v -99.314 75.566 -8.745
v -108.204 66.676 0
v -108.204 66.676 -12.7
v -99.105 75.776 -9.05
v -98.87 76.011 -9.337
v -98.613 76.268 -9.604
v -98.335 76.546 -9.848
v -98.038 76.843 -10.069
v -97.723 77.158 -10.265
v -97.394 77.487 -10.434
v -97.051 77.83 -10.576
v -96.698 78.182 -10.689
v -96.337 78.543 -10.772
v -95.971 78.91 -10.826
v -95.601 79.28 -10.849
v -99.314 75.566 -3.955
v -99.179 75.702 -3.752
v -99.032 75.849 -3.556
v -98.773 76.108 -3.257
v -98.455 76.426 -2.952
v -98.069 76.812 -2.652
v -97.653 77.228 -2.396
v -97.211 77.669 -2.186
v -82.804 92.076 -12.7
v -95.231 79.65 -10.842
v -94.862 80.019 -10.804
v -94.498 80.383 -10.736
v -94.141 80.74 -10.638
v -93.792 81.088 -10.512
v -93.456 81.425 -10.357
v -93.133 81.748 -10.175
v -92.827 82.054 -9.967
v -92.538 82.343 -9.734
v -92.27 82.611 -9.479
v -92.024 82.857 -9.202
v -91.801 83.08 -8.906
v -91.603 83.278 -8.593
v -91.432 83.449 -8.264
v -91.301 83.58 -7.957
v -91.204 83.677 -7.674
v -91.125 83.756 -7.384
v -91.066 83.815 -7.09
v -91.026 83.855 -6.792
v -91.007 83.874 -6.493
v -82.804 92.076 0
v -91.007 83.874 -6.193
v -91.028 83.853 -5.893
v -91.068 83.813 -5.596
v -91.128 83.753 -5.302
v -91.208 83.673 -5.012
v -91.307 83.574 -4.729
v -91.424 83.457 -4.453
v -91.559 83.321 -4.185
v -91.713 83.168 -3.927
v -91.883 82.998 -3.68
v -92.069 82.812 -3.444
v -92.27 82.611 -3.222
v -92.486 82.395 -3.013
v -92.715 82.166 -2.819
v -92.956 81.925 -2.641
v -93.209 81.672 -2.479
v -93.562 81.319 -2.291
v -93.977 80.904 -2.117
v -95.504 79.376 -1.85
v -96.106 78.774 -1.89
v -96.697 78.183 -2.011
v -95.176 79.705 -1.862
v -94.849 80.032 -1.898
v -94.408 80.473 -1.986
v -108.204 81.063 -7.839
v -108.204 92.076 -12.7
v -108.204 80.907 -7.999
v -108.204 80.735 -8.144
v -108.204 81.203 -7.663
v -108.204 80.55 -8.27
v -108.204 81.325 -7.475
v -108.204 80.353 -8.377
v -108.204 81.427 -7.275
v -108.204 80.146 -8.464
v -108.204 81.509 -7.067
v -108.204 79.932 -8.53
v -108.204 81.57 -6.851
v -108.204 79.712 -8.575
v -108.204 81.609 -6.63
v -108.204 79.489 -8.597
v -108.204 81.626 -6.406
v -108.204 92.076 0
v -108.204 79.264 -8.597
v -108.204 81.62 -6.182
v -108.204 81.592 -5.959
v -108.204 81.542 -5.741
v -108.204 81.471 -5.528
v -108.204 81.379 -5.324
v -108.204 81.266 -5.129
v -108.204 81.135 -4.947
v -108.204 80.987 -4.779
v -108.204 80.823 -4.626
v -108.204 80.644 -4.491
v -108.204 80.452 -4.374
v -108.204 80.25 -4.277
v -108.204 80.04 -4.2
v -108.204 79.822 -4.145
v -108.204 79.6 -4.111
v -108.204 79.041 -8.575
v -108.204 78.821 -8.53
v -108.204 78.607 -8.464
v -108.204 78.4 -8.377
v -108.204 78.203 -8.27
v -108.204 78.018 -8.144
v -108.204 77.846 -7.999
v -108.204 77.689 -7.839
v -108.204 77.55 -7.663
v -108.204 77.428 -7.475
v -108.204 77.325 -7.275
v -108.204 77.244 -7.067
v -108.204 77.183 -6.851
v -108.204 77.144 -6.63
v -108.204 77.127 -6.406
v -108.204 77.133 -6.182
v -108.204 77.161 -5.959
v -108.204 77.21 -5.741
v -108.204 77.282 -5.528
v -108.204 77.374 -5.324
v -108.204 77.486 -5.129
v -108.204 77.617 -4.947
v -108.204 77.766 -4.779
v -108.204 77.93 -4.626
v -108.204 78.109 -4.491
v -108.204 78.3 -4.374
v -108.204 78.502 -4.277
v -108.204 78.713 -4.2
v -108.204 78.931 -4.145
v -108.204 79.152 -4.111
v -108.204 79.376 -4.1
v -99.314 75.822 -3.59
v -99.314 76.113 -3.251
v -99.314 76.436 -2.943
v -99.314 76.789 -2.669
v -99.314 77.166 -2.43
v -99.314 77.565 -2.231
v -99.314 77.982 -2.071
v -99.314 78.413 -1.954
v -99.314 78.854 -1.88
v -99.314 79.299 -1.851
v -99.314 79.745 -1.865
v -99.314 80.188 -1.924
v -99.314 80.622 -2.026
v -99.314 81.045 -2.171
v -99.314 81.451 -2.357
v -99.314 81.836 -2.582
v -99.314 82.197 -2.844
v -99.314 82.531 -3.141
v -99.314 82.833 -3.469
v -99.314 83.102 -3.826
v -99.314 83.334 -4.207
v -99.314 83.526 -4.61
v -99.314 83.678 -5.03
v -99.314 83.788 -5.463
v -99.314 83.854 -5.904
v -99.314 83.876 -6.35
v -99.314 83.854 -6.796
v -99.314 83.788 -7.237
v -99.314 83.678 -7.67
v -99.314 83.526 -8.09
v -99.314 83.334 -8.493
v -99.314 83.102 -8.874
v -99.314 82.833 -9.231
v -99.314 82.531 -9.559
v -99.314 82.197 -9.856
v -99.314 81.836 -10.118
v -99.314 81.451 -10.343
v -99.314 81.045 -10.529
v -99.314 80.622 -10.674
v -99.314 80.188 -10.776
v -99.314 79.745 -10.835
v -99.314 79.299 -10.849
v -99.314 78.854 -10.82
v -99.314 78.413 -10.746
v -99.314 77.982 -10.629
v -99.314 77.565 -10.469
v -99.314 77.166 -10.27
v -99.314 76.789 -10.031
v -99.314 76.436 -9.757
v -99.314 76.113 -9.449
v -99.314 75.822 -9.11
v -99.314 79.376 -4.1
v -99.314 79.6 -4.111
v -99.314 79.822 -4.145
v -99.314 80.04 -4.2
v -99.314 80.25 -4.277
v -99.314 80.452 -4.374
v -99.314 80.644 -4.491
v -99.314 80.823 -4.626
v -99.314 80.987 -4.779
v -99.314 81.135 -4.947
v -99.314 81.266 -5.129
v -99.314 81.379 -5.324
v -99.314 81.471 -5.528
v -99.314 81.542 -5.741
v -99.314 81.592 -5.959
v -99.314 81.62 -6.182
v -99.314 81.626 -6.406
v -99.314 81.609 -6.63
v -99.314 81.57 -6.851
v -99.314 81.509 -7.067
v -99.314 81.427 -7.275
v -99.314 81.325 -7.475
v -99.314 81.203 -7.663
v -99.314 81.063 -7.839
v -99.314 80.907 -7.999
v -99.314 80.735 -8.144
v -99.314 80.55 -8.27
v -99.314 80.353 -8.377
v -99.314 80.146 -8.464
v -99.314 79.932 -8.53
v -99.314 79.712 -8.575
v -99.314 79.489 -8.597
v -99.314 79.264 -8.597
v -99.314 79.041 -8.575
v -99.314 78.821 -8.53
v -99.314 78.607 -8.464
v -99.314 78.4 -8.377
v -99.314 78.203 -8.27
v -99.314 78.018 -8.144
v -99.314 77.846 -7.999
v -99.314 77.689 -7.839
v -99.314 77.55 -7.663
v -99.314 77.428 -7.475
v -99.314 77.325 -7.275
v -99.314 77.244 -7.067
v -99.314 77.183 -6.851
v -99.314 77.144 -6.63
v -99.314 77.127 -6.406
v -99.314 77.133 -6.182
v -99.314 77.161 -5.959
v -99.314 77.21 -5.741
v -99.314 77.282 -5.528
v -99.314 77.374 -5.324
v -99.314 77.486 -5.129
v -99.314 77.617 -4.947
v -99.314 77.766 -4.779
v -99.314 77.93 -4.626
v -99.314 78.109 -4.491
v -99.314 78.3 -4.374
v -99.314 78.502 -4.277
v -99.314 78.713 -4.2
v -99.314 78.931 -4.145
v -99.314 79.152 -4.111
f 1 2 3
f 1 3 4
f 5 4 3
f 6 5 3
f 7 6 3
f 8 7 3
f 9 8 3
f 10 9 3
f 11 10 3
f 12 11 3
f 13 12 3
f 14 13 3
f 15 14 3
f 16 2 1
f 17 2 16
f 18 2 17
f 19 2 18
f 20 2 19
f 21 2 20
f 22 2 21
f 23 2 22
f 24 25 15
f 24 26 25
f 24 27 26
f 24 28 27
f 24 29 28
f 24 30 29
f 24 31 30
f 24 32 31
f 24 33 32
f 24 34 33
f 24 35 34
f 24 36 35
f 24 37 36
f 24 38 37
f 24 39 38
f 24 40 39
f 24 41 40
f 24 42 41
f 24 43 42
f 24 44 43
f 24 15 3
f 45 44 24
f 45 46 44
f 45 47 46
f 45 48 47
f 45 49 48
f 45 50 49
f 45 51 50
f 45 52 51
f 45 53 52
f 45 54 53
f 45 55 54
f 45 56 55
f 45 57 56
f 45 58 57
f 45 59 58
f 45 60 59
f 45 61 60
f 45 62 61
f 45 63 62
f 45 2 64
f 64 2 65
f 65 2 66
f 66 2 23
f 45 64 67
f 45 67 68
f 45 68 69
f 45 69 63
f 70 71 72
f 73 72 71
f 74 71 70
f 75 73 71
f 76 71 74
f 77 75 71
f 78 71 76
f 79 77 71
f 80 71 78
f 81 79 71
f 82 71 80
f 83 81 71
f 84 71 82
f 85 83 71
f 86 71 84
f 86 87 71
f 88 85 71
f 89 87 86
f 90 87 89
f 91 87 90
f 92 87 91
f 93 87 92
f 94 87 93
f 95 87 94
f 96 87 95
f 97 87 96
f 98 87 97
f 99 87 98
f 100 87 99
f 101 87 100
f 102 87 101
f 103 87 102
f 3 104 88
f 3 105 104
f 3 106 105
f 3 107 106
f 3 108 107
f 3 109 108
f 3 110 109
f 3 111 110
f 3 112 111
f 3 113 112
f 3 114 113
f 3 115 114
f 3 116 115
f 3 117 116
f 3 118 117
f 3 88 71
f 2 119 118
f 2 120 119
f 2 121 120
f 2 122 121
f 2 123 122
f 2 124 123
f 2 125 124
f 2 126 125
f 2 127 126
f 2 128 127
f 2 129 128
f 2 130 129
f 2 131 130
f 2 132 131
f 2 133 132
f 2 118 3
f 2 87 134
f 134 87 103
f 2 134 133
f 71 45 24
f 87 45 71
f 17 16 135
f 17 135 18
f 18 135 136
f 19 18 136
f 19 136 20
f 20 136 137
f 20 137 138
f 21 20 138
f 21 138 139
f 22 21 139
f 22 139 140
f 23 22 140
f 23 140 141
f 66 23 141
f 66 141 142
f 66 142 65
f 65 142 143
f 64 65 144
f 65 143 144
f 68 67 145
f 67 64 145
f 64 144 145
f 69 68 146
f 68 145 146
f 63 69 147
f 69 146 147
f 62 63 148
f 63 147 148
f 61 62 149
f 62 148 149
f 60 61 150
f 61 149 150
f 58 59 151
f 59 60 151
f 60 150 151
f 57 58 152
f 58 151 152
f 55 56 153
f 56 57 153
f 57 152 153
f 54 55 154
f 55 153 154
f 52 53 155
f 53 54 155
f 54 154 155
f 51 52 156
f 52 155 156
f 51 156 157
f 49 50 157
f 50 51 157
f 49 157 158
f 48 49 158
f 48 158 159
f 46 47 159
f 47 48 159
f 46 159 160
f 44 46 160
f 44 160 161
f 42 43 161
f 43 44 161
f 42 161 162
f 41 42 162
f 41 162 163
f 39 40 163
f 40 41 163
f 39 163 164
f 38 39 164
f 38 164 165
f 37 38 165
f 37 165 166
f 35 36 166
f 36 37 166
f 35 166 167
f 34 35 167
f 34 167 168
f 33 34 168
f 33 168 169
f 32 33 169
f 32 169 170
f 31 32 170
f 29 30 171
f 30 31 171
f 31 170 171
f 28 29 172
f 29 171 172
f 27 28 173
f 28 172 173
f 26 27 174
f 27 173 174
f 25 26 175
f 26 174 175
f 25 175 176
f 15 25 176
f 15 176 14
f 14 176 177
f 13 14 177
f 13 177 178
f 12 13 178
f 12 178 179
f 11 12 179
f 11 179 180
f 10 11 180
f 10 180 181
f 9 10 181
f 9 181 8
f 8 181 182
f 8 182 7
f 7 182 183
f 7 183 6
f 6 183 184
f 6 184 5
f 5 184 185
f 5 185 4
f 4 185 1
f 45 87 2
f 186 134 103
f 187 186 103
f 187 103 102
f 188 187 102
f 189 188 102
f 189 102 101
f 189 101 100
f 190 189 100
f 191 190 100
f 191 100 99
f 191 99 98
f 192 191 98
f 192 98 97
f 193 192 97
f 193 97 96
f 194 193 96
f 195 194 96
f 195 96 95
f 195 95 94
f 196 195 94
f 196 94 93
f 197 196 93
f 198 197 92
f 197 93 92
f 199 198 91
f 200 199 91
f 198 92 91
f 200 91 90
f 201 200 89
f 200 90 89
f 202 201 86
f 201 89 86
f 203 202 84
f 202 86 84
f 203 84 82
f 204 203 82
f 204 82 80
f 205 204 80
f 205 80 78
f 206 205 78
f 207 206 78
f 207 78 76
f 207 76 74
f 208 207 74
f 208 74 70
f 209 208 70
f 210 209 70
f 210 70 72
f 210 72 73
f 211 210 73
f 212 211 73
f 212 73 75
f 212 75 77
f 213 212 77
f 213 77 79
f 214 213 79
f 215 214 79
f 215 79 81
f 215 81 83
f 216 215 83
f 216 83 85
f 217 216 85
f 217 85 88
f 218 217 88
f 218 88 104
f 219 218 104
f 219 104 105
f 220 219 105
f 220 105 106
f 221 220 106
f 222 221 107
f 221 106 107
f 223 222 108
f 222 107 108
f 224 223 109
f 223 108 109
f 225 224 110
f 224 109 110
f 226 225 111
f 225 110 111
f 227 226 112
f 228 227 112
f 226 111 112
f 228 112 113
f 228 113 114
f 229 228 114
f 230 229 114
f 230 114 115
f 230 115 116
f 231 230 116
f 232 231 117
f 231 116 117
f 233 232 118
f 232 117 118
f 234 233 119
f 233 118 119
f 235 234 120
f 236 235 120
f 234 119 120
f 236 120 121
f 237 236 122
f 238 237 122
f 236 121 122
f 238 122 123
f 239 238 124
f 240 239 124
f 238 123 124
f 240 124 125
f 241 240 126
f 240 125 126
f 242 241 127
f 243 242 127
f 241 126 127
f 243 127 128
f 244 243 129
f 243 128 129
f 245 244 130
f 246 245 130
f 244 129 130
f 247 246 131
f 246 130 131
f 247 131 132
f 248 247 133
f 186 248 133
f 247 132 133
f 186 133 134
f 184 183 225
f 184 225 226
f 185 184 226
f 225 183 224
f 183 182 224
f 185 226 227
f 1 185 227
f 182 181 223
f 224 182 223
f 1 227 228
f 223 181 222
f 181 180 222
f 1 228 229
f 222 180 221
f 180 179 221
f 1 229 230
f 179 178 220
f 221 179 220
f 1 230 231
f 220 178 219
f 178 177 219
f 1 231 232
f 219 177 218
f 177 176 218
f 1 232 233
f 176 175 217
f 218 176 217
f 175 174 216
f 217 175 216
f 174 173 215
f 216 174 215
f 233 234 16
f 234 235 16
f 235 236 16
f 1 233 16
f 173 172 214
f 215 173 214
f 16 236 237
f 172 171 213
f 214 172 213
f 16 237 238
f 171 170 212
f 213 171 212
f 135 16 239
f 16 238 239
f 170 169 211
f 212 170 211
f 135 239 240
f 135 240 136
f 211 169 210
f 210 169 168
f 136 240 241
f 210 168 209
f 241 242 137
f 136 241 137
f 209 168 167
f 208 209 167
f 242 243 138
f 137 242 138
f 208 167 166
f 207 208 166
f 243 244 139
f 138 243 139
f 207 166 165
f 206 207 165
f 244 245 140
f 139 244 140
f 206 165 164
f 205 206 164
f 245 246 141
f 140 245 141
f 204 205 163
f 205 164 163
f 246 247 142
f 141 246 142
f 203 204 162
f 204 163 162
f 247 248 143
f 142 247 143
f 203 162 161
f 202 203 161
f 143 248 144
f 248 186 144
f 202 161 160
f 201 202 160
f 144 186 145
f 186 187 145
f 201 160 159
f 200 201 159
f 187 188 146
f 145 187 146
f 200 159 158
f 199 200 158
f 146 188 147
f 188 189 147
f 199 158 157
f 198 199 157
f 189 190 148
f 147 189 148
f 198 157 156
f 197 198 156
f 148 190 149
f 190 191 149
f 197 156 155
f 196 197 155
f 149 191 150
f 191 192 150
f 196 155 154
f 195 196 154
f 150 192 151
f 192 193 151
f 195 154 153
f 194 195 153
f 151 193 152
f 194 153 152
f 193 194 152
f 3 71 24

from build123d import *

# Parameters (mm, degrees)
BOSS_EXTRUDE2_DEPTH = 12.7
SKETCH5_R           = 2.25
CUT_EXTRUDE1_DEPTH  = 26.4
SKETCH6_R           = 4.5
CUT_EXTRUDE2_DEPTH  = 17.51


with BuildPart() as part:
    # xs → Boss-Extrude2 (new body)
    with BuildSketch(Plane.XY):
        Polygon((-108.204482014, 92.076361751), (-108.204482014, 66.676361751), (-82.804482014, 92.076361751), align=None)
    extrude(amount=-BOSS_EXTRUDE2_DEPTH)

    # Sketch5 → Cut-Extrude1 (cut, through all)
    with BuildSketch(Plane.ZY.offset(108.204482014)):
        with Locations((-6.35, 79.376361751)):
            Circle(SKETCH5_R)
    extrude(amount=-CUT_EXTRUDE1_DEPTH, mode=Mode.SUBTRACT)

    # Sketch6 → Cut-Extrude2 (cut, through all)
    with BuildSketch(Plane.ZY.offset(99.314482014)):
        with Locations((-6.35, 79.376361751)):
            Circle(SKETCH6_R)
    extrude(amount=-CUT_EXTRUDE2_DEPTH, mode=Mode.SUBTRACT)


solid = part.part
